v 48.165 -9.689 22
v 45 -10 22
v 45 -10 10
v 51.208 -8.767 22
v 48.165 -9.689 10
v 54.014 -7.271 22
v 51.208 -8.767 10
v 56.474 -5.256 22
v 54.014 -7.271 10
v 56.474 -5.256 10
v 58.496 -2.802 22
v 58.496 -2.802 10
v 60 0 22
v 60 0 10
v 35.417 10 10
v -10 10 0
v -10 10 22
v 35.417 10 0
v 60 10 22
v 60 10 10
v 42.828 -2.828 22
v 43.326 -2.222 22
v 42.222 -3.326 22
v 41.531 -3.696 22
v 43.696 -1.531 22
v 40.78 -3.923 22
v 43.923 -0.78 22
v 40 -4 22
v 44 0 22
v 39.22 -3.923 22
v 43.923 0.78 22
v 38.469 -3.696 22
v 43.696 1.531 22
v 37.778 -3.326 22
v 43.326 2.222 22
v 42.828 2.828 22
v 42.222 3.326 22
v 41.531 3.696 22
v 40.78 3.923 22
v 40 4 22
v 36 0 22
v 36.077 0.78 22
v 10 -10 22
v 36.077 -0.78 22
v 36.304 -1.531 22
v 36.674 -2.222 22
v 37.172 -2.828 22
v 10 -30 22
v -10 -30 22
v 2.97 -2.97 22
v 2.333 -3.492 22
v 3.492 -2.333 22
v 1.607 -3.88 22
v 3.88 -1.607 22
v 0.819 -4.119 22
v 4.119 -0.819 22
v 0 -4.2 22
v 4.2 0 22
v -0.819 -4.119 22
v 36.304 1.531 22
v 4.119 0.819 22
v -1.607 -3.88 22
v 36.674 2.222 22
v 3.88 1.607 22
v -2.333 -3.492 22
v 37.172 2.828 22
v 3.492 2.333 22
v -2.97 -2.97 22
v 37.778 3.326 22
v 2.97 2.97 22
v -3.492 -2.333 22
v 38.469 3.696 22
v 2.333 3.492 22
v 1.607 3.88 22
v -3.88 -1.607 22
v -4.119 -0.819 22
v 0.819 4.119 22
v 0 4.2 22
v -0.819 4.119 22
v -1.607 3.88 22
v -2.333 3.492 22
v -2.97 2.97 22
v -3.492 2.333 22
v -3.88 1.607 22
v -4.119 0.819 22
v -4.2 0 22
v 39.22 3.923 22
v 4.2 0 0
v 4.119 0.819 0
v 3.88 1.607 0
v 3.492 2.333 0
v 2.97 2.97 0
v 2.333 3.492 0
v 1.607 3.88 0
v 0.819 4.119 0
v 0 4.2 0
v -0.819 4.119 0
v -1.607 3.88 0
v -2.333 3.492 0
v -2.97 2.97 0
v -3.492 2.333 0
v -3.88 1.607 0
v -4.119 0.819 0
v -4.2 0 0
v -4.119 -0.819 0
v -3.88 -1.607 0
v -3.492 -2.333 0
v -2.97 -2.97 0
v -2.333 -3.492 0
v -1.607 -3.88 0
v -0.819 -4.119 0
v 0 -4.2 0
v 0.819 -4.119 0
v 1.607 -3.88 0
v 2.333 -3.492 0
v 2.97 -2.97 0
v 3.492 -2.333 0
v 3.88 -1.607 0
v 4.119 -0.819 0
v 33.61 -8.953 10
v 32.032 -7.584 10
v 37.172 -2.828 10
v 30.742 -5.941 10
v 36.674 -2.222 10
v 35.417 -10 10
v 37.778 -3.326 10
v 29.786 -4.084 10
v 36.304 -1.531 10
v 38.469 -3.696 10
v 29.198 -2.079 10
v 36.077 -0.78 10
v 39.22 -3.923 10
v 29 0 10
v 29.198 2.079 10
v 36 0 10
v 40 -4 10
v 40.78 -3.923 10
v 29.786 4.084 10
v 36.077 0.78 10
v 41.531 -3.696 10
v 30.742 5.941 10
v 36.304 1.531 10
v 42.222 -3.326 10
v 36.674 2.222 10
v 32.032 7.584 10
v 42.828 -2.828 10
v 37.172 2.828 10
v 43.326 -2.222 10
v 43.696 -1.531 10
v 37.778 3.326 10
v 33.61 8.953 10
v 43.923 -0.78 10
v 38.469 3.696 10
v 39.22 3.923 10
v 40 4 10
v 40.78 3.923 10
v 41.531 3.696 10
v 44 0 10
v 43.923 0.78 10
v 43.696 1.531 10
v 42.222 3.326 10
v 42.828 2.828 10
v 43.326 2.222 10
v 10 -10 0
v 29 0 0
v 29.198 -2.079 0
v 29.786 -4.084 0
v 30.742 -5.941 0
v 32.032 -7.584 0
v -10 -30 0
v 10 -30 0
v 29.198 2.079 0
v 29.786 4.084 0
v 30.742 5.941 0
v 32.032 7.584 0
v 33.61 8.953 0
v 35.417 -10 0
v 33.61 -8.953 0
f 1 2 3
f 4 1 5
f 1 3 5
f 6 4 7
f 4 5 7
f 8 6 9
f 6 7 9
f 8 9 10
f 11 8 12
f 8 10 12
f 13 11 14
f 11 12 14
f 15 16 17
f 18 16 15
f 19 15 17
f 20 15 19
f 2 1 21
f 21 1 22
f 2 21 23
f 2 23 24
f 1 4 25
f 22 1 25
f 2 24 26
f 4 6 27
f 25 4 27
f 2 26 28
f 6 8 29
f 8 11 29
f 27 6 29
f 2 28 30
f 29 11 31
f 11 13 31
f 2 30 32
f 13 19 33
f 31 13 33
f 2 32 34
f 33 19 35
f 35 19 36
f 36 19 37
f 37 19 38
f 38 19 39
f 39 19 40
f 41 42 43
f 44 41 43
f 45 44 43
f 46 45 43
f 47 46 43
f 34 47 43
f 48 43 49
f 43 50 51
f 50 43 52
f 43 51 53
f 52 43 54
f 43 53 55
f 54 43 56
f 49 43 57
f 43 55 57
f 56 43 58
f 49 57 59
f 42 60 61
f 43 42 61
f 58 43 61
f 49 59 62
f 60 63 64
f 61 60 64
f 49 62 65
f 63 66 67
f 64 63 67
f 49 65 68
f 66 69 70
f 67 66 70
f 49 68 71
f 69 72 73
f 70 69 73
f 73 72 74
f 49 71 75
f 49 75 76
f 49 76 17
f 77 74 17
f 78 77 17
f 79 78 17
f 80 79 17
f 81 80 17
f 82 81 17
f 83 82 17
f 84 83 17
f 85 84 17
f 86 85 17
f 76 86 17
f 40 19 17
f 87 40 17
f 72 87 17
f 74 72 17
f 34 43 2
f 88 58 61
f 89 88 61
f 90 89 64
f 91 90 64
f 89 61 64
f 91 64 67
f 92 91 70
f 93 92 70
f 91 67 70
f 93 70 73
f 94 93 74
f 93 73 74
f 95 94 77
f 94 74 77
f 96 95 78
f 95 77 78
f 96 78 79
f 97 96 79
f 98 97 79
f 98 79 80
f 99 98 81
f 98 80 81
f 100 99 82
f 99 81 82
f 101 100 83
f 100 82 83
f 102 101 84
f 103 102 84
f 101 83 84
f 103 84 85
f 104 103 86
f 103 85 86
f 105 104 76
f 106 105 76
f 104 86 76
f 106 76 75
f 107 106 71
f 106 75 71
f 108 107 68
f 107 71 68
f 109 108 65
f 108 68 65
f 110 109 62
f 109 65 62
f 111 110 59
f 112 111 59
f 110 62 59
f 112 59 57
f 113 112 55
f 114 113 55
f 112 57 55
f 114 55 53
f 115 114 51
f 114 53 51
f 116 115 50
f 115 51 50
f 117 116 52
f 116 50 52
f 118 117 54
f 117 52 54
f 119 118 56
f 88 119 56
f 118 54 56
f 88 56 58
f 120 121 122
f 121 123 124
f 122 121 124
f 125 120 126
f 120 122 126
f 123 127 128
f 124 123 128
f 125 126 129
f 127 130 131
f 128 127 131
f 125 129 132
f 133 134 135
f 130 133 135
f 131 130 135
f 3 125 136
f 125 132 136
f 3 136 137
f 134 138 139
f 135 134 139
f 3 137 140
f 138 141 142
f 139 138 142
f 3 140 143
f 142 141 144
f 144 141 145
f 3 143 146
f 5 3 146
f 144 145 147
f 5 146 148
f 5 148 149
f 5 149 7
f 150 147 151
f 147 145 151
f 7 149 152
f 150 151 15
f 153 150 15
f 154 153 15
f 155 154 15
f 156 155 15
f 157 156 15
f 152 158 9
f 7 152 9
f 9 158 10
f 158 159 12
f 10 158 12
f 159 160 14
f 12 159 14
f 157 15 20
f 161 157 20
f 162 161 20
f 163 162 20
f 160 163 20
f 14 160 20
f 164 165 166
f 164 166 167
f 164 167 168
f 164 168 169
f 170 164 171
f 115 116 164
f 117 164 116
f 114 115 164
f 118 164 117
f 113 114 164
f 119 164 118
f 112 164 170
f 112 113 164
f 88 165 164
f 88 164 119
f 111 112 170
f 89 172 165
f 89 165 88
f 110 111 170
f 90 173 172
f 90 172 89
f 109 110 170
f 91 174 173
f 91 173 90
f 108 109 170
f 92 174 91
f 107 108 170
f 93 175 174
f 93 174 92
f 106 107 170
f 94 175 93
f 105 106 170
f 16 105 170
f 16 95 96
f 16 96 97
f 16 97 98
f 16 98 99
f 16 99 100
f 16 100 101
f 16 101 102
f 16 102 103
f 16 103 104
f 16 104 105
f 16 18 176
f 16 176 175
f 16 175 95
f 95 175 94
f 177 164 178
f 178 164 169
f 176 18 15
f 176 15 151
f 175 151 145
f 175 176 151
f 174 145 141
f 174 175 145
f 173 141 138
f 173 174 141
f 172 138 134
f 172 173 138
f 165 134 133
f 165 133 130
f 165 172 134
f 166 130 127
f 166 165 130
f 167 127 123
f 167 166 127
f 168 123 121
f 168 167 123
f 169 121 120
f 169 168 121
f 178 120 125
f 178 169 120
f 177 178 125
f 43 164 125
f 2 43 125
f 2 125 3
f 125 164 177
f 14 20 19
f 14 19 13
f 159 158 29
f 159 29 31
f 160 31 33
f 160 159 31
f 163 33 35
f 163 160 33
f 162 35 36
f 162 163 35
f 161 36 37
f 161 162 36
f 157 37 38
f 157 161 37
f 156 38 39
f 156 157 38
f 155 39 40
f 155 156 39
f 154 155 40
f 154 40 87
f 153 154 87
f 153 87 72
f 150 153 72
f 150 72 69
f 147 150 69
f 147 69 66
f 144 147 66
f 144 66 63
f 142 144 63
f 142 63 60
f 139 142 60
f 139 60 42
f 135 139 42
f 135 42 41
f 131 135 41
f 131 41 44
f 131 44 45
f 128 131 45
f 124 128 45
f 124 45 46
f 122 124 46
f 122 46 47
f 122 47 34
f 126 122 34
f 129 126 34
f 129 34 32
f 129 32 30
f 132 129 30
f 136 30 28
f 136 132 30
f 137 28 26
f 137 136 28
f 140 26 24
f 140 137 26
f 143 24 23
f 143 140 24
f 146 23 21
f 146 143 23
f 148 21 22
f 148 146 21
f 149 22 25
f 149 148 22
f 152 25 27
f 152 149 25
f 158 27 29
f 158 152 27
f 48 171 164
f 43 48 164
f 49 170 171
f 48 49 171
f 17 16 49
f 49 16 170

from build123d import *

# Parameters (mm, degrees)
PAD_DEPTH       = 22
SKETCH001_R     = 4
POCKET_DEPTH    = 22
POCKET001_DEPTH = 10
SKETCH002_R     = 4.2
POCKET002_DEPTH = 22


with BuildPart() as part:
    # Sketch → Pad (new body)
    with BuildSketch(Plane.XY):
        with BuildLine():
            Line((-10, 10), (60, 10))
            Line((60, 10), (60, 0))
            ThreePointArc((45, -10), (54.013878, -7.270817), (60, 0))
            Line((10, -10), (45, -10))
            Line((10, -30), (10, -10))
            Line((-10, -30), (10, -30))
            Line((-10, 10), (-10, -30))
        make_face()
    extrude(amount=PAD_DEPTH)

    # Sketch001 → Pocket (cut)
    with BuildSketch(Plane.XY):
        with Locations((40, 0)):
            Circle(SKETCH001_R)
    extrude(amount=POCKET_DEPTH, mode=Mode.SUBTRACT)

    # Sketch004 → Pocket001 (cut)
    with BuildSketch(Plane.XY):
        with BuildLine():
            ThreePointArc((40, 11), (29, 0), (40, -11))
            Line((40, -11), (45, -11))
            ThreePointArc((45, -11), (54.340905, -7.958424), (60.1, 0))
            Line((60.1, 11), (60.1, 0))
            Line((40, 11), (60.1, 11))
        make_face()
    extrude(amount=POCKET001_DEPTH, mode=Mode.SUBTRACT)

    # Sketch002 → Pocket002 (cut)
    with BuildSketch(Plane.XY.offset(22)):
        Circle(SKETCH002_R)
    extrude(amount=-POCKET002_DEPTH, mode=Mode.SUBTRACT)


solid = part.part
